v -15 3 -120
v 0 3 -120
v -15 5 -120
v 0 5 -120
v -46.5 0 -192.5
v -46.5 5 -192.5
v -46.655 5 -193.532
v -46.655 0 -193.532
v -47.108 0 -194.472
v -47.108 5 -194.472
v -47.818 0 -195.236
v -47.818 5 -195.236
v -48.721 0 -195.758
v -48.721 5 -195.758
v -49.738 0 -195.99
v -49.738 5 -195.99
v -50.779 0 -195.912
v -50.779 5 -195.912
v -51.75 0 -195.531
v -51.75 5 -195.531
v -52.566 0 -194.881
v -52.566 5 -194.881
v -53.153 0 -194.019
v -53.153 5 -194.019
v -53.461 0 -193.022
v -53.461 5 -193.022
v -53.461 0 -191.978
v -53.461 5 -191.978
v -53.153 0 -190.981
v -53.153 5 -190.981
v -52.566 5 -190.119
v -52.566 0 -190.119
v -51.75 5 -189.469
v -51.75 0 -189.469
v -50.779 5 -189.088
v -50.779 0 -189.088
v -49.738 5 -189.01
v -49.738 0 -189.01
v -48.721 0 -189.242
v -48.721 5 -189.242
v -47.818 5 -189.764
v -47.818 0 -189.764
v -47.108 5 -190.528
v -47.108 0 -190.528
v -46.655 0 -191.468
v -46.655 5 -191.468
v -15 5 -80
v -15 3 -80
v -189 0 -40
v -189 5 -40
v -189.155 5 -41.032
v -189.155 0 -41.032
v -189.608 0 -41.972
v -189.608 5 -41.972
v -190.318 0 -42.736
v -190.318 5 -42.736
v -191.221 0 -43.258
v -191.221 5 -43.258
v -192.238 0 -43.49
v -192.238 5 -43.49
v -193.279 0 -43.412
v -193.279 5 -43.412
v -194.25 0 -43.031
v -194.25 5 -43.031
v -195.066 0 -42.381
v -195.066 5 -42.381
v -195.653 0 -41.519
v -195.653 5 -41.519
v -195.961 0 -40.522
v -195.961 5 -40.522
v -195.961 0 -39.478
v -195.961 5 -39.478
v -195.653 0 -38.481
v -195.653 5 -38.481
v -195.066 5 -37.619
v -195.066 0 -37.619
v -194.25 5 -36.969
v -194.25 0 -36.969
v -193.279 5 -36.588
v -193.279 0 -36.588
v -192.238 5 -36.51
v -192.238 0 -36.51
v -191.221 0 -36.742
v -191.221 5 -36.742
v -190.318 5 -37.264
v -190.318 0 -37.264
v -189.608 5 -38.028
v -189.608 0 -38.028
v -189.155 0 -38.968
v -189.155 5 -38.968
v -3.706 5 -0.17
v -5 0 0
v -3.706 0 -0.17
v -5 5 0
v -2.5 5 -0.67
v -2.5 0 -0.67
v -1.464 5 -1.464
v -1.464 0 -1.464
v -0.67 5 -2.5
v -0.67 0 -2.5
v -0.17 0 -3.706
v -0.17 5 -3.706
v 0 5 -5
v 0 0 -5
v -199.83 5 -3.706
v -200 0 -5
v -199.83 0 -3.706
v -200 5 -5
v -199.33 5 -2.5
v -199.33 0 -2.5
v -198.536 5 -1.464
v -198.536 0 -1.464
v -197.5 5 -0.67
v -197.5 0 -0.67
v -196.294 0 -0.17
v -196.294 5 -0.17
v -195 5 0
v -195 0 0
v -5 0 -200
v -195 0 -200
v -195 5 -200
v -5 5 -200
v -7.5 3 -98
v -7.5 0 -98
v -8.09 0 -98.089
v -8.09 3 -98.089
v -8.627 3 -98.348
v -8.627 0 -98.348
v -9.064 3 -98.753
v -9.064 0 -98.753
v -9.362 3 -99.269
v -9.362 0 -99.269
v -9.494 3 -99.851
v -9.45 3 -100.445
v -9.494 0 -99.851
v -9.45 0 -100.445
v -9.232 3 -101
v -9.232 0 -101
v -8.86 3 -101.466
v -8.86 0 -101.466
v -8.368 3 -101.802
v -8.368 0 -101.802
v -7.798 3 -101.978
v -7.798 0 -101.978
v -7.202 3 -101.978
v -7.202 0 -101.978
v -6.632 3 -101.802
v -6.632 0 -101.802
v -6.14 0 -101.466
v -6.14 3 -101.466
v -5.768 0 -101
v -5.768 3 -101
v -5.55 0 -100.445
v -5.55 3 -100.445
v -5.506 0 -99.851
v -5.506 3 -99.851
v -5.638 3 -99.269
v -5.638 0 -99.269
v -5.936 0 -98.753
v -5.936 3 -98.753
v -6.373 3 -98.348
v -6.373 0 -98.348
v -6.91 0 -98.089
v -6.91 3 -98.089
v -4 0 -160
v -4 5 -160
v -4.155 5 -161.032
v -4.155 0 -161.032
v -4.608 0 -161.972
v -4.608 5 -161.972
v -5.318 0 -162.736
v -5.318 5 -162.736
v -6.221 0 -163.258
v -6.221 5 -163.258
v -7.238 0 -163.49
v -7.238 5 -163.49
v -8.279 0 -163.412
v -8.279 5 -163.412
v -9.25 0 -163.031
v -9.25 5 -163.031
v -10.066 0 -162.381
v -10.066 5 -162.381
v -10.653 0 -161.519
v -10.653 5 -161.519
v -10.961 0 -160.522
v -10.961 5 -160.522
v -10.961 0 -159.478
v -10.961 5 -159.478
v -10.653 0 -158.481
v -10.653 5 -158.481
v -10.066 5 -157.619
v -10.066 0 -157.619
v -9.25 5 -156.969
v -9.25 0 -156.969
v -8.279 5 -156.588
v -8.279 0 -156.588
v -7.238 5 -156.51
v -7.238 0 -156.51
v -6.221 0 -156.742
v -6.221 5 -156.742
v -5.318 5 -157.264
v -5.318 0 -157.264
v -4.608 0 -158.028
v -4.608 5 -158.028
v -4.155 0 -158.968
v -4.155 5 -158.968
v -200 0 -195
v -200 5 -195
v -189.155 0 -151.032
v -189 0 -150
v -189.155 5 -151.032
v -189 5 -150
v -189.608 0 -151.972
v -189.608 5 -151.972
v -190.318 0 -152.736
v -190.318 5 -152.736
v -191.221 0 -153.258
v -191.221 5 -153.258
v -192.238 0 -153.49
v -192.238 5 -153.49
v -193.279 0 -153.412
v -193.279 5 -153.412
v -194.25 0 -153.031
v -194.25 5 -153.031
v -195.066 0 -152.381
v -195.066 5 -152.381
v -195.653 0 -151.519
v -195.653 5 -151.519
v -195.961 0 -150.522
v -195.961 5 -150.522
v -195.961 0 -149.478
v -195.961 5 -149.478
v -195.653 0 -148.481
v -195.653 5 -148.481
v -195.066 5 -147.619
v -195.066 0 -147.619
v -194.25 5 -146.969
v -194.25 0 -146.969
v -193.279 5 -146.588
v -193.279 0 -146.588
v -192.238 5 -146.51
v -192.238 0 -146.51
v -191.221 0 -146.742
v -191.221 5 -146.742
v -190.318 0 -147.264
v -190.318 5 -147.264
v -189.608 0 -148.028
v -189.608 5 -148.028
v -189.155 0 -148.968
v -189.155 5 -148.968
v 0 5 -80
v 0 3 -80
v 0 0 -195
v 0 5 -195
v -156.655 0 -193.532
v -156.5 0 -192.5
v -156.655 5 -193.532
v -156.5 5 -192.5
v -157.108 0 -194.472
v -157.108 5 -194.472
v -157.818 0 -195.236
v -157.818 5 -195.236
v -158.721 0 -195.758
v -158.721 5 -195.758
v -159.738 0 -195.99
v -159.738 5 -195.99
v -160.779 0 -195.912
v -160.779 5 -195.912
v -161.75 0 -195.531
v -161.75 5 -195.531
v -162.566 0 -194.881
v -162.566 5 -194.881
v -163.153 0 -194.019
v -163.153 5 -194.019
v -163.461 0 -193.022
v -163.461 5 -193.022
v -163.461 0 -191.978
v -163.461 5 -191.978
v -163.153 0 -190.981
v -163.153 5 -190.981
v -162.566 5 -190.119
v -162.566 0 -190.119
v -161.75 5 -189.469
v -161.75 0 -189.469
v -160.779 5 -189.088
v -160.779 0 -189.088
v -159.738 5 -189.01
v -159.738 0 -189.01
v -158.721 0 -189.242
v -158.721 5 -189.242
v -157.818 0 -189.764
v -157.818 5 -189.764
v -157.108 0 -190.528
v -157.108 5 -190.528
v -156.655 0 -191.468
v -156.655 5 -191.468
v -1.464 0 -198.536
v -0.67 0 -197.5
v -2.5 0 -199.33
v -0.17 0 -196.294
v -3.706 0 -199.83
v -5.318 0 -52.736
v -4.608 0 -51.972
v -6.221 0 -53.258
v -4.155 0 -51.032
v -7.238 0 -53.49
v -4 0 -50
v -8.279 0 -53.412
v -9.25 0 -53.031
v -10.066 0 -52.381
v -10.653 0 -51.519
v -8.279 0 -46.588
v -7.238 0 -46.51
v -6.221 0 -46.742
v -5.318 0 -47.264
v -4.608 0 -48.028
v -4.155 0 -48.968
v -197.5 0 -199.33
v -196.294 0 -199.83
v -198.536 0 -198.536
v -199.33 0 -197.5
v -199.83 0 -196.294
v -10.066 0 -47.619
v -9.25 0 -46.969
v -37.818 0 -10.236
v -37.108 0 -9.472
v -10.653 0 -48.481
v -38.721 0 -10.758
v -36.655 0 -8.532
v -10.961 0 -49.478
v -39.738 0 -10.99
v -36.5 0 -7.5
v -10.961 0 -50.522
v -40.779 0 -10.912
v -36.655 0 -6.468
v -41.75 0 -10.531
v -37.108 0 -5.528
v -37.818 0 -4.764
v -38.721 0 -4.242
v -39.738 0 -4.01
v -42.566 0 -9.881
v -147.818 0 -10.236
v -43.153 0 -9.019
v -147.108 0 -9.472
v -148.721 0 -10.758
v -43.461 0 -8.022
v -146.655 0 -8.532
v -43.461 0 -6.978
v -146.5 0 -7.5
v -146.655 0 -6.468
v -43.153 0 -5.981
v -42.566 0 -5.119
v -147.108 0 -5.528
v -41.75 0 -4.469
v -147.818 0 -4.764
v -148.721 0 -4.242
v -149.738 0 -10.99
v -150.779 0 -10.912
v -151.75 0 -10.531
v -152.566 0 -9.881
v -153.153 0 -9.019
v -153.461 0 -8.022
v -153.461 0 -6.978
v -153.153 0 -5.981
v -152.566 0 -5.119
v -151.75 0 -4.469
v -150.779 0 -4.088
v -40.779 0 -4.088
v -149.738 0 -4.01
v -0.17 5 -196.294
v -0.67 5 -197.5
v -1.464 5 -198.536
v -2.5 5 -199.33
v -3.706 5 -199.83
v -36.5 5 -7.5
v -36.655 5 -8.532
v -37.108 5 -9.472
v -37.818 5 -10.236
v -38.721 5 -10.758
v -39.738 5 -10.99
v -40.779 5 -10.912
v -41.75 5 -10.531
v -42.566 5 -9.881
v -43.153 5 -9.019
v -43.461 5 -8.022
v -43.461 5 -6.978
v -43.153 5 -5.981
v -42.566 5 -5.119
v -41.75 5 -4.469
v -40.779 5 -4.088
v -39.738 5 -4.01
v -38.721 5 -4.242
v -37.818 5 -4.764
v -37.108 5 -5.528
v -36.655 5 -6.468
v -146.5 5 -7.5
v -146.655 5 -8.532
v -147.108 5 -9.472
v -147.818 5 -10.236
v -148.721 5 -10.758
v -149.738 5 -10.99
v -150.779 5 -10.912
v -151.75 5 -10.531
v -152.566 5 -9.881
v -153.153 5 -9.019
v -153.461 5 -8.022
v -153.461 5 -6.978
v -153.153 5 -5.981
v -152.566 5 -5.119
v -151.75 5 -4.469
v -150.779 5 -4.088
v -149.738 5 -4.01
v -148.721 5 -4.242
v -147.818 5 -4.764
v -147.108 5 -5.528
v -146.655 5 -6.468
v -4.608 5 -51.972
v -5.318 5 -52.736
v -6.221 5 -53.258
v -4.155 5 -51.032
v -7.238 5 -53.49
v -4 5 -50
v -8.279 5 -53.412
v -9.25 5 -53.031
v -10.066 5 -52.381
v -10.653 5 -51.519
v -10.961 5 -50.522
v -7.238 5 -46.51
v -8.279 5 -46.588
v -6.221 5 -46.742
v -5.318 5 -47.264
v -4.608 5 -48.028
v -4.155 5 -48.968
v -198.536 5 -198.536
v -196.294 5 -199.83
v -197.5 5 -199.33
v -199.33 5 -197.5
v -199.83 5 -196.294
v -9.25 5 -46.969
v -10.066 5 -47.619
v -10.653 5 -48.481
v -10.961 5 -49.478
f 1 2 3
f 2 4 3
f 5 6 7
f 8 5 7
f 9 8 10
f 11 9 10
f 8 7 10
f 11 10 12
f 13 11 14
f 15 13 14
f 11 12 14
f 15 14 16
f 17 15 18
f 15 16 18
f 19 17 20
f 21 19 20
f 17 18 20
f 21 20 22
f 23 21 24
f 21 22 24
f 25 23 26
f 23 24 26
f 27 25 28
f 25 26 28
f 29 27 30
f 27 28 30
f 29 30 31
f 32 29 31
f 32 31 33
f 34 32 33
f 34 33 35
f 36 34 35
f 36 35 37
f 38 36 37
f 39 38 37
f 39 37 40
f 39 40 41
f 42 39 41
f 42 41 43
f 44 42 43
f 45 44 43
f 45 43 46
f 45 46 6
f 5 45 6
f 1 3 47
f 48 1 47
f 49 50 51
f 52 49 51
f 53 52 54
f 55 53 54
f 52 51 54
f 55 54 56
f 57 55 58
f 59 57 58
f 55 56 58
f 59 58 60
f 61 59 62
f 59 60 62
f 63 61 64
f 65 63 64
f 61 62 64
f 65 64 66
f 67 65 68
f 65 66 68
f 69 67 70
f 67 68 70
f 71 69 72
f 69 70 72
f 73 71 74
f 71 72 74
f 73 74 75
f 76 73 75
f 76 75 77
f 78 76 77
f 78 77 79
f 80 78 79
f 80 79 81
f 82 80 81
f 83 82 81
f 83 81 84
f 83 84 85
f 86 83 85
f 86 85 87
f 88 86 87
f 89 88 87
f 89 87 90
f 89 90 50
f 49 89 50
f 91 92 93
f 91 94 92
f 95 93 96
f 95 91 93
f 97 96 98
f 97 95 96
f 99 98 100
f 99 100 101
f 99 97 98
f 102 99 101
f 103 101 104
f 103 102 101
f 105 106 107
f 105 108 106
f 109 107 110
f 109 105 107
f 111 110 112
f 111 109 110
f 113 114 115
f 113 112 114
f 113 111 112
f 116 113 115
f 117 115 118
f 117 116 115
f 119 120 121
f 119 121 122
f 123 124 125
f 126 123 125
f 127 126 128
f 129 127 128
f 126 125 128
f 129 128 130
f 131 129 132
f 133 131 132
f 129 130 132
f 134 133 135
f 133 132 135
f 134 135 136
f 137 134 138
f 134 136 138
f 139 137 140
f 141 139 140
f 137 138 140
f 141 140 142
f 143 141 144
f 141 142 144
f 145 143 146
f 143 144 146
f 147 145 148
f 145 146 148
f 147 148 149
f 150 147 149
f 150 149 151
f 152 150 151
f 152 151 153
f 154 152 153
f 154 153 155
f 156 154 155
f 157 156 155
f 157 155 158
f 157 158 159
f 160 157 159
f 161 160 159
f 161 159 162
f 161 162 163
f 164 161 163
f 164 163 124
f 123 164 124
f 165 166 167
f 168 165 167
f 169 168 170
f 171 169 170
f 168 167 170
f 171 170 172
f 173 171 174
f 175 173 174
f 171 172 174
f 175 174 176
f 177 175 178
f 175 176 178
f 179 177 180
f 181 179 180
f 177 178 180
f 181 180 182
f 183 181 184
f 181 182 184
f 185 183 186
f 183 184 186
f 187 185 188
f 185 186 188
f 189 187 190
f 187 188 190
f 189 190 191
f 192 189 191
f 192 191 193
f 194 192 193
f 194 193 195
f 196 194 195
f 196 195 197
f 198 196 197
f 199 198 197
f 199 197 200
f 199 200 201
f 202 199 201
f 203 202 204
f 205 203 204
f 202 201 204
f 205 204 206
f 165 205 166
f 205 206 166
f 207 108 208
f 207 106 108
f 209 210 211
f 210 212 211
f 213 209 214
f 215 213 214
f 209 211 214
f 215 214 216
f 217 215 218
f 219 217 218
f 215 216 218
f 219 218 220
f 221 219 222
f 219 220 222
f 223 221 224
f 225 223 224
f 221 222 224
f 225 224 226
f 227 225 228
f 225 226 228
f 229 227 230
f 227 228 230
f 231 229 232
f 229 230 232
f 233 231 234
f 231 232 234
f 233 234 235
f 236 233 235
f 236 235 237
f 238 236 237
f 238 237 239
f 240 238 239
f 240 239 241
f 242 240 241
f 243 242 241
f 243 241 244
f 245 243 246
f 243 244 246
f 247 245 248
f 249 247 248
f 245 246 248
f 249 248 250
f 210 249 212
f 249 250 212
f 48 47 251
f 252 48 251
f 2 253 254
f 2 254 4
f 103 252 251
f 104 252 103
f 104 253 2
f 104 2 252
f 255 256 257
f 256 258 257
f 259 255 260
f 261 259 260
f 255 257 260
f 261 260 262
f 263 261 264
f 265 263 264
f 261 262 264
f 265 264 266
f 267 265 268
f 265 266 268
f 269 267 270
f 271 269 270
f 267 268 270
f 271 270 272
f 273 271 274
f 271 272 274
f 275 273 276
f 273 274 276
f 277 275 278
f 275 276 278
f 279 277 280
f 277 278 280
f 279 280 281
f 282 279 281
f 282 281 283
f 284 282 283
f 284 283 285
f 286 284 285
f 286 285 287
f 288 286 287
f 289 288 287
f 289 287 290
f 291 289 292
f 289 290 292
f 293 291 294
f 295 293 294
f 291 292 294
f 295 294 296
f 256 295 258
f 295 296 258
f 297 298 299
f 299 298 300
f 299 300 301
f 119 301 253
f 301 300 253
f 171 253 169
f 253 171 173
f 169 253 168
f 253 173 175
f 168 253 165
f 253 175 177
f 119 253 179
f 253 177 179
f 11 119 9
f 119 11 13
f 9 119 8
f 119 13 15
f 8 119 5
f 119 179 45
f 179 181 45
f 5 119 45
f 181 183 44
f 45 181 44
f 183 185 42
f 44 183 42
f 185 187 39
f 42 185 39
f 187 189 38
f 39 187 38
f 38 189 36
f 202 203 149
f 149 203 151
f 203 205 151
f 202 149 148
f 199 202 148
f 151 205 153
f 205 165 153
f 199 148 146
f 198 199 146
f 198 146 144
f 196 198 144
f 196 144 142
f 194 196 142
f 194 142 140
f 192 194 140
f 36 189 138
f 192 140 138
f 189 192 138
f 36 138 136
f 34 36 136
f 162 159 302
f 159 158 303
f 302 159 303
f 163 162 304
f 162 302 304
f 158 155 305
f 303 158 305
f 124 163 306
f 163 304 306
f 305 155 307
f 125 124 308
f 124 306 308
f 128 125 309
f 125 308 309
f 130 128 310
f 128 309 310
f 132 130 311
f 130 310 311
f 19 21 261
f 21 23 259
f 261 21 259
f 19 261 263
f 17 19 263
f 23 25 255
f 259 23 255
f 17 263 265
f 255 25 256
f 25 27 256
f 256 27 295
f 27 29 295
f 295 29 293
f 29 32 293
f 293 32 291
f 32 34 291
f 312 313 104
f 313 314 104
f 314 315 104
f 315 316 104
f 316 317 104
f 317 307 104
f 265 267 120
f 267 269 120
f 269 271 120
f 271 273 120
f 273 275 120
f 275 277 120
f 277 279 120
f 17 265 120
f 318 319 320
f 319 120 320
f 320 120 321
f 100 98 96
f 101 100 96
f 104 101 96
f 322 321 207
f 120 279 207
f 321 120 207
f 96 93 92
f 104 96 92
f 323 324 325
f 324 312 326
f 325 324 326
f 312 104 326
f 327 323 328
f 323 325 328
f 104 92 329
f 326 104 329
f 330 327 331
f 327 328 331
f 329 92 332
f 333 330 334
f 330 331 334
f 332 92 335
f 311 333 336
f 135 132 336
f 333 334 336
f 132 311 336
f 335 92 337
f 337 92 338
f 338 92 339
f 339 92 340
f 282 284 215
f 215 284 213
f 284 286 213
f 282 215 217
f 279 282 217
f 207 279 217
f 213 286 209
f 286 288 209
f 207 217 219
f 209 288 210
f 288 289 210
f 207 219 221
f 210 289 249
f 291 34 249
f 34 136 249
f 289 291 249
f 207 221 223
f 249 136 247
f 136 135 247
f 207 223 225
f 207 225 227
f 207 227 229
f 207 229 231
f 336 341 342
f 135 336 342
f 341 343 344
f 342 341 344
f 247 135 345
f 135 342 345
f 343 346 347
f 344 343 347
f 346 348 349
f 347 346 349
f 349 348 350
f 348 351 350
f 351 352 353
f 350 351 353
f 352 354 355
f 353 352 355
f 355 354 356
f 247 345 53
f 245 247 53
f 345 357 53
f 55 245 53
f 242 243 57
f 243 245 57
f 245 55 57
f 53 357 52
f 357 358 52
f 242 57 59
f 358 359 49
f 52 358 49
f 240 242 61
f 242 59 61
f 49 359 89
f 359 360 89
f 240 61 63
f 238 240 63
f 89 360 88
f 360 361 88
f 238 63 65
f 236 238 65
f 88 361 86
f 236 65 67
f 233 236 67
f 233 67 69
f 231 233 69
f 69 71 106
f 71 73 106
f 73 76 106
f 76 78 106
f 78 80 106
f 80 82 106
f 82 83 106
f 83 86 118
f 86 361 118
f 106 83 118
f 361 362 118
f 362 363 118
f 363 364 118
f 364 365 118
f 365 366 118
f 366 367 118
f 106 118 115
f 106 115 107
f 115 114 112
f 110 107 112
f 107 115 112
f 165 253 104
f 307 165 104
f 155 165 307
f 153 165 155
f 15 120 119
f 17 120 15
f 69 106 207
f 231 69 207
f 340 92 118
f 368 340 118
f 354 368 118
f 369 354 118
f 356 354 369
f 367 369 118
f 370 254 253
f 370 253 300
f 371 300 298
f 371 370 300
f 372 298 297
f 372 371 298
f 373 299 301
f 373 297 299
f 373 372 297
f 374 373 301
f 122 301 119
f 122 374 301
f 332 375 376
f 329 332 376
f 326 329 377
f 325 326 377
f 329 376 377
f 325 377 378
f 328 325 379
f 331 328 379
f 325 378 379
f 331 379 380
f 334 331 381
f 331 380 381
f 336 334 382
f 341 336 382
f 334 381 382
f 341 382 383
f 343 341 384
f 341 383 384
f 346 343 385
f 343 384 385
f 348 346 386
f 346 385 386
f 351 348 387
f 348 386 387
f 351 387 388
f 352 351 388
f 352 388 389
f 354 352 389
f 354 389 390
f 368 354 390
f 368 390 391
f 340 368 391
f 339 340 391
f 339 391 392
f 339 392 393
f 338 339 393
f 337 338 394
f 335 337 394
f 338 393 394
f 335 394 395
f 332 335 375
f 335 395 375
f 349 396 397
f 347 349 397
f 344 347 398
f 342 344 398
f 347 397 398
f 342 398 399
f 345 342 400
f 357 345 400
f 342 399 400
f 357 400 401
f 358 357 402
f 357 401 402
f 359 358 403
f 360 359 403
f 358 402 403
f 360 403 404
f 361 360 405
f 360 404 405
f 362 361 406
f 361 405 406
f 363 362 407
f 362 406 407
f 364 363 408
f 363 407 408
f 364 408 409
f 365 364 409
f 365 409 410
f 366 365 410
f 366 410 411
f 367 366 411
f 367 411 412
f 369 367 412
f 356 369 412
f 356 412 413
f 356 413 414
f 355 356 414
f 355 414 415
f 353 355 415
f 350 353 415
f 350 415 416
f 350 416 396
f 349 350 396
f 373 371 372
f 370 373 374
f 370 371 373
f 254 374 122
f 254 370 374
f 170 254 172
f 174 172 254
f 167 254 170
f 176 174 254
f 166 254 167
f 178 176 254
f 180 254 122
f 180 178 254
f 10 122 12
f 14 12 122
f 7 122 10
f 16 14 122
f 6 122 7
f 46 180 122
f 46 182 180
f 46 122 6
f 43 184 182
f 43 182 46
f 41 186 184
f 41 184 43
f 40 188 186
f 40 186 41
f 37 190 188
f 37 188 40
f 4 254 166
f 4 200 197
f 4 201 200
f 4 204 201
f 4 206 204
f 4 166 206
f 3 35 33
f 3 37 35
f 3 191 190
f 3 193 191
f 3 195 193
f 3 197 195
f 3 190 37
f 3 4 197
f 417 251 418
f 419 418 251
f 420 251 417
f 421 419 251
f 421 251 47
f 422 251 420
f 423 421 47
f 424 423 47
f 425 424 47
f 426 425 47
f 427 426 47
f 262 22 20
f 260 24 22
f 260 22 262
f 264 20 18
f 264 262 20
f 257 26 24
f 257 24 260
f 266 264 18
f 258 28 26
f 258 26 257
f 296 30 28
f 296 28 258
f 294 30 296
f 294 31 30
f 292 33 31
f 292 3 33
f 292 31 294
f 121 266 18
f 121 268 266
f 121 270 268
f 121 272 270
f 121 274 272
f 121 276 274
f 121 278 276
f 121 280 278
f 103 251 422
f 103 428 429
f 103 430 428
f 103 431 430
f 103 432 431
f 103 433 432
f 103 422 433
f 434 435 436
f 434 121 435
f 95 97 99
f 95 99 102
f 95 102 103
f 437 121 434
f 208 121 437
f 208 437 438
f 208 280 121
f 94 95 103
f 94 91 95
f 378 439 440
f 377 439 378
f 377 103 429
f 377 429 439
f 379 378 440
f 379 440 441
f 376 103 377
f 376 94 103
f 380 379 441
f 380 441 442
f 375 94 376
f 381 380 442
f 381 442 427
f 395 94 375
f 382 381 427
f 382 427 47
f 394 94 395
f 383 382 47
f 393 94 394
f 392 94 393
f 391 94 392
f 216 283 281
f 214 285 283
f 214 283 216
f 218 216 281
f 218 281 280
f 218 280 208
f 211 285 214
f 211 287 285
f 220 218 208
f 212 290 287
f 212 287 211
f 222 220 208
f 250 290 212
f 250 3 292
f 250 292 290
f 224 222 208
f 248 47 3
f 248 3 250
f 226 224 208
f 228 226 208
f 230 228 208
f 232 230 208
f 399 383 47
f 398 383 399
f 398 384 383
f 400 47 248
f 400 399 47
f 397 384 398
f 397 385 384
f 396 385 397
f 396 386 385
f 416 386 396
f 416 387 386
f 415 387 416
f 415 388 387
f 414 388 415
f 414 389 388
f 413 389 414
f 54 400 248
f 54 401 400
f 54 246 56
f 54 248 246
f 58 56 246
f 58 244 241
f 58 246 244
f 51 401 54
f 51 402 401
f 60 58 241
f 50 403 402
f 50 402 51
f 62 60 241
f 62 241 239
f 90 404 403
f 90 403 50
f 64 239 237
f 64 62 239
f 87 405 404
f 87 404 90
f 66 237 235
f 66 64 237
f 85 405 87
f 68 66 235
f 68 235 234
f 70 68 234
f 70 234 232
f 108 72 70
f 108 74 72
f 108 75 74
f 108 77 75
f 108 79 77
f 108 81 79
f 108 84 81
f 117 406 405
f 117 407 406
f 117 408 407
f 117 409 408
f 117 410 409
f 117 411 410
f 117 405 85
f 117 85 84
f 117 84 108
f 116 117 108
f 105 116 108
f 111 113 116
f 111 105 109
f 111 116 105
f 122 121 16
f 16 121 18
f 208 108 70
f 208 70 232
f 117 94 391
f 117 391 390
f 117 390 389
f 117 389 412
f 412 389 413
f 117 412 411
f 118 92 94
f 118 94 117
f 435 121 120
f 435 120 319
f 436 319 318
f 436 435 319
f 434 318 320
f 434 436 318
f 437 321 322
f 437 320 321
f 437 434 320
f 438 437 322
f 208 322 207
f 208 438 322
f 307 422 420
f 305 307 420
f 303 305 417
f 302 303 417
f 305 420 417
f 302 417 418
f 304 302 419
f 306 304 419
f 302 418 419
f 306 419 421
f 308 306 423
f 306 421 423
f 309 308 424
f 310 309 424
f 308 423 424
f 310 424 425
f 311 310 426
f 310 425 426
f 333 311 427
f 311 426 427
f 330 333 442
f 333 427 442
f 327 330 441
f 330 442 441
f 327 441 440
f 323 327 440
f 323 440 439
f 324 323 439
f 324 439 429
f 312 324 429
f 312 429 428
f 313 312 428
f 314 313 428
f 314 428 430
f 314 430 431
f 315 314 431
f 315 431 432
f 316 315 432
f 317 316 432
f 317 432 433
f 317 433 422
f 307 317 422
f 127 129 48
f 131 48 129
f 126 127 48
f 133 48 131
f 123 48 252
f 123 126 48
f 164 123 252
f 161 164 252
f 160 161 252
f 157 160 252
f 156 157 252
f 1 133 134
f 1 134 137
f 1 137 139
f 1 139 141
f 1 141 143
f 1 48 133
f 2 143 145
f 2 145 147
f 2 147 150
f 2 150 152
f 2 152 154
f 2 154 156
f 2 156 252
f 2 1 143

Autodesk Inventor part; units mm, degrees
ref_plane "YZ Plane" through (0, 0, 0) normal (1, 0, 0) x (0, 1, 0)
ref_plane "XZ Plane" through (0, 0, 0) normal (0, 1, 0) x (-1, 0, 0)
sketch "Sketch1" plane through (0, 0, 0) normal (0, 1, 0) x (-1, 0, 0)
  line L0 (0, 0) -> (200, 0)
  line L1 (200, 0) -> (200, -200)
  line L2 (200, -200) -> (0, -200)
  line L3 (0, -200) -> (0, 0)
  dimension "d0" = 200
  dimension "d1" = 200
extrude "Extrusion1" add sketch "Sketch1" along normal blind 5
fillet "Fillet2" radius 5 4 edges at (0, 2.5, 0) (0, 2.5, -200) (-200, 2.5, 0) (-200, 2.5, -200)
sketch "Sketch4" plane through (0, 5, 0) normal (0, 1, 0) x (1, 0, 0)
  circle A0 centre (-7.5, 50) radius 3.5
  circle A1 centre (-40, 7.5) radius 3.5
  line L0 (-195, 0) -> (-5, 0) projected
  line L1 (0, 5) -> (0, 195) projected
  circle A2 centre (-150, 7.5) radius 3.5
  circle A3 centre (-192.5, 40) radius 3.5
  line L2 (-200, 195) -> (-200, 5) projected
  circle A4 centre (-192.5, 150) radius 3.5
  circle A5 centre (-160, 192.5) radius 3.5
  circle A6 centre (-50, 192.5) radius 3.5
  circle A7 centre (-7.5, 160) radius 3.5
  line L3 (-5, 200) -> (-195, 200) projected
  point P0 (0, 0)
  dimension "d42" = 7
  dimension "d43" = 7
  dimension "d44" = 50
  dimension "d45" = 40
  dimension "d46" = 7.5
  dimension "d47" = 7.5
  dimension "d48" = 7
  dimension "d49" = 7
  dimension "d50" = 40
  dimension "d51" = 50
  dimension "d52" = 7.5
  dimension "d53" = 7.5
  dimension "d73" = 7.5
  dimension "d74" = 7.5
  dimension "d75" = 7.5
  dimension "d76" = 7.5
  dimension "d77" = 7
  dimension "d78" = 7
  dimension "d79" = 7
  dimension "d80" = 7
  dimension "d81" = 50
  dimension "d82" = 40
  dimension "d83" = 50
  dimension "d84" = 40
extrude "Extrusion4" cut sketch "Sketch4" against normal through all
ref_plane "Work Plane2" through (-195, 0, -100) normal (0, 0, 1) x (1, 0, 0)
sketch "Sketch5" plane through (0, 5, 0) normal (0, 1, 0) x (1, 0, 0)
  line L0 (-195, 0) -> (-5, 0) projected
  line L1 (-5, 200) -> (-195, 200) projected
  line L2 (0, 120) -> (-15, 120)
  line L3 (-15, 120) -> (-15, 80)
  line L4 (-15, 80) -> (0, 80)
  line L5 (0, 80) -> (0, 120)
  line L6 (0, 5) -> (0, 195) projected
  point P0 (0, 0)
  dimension "d58" = 80
  dimension "d59" = 80
  dimension "d60" = 15
  dimension "d61" = 0
extrude "Extrusion5" cut sketch "Sketch5" against normal blind 2
sketch "Sketch6" plane through (0, 3, 0) normal (0, 1, 0) x (1, 0, 0)
  line L0 (0, 120) -> (0, 80) projected
  line L1 (0, 80) -> (-15, 80) projected
  point P0 (0, 0)
  point P1 (-7.5, 100)
  dimension "d64" = 7.5
  dimension "d65" = 20
hole "Hole1" at (-7.5, 3, -100) direction (0, -1, 0) diameter 4 end through all
properties part number "top_plate"
